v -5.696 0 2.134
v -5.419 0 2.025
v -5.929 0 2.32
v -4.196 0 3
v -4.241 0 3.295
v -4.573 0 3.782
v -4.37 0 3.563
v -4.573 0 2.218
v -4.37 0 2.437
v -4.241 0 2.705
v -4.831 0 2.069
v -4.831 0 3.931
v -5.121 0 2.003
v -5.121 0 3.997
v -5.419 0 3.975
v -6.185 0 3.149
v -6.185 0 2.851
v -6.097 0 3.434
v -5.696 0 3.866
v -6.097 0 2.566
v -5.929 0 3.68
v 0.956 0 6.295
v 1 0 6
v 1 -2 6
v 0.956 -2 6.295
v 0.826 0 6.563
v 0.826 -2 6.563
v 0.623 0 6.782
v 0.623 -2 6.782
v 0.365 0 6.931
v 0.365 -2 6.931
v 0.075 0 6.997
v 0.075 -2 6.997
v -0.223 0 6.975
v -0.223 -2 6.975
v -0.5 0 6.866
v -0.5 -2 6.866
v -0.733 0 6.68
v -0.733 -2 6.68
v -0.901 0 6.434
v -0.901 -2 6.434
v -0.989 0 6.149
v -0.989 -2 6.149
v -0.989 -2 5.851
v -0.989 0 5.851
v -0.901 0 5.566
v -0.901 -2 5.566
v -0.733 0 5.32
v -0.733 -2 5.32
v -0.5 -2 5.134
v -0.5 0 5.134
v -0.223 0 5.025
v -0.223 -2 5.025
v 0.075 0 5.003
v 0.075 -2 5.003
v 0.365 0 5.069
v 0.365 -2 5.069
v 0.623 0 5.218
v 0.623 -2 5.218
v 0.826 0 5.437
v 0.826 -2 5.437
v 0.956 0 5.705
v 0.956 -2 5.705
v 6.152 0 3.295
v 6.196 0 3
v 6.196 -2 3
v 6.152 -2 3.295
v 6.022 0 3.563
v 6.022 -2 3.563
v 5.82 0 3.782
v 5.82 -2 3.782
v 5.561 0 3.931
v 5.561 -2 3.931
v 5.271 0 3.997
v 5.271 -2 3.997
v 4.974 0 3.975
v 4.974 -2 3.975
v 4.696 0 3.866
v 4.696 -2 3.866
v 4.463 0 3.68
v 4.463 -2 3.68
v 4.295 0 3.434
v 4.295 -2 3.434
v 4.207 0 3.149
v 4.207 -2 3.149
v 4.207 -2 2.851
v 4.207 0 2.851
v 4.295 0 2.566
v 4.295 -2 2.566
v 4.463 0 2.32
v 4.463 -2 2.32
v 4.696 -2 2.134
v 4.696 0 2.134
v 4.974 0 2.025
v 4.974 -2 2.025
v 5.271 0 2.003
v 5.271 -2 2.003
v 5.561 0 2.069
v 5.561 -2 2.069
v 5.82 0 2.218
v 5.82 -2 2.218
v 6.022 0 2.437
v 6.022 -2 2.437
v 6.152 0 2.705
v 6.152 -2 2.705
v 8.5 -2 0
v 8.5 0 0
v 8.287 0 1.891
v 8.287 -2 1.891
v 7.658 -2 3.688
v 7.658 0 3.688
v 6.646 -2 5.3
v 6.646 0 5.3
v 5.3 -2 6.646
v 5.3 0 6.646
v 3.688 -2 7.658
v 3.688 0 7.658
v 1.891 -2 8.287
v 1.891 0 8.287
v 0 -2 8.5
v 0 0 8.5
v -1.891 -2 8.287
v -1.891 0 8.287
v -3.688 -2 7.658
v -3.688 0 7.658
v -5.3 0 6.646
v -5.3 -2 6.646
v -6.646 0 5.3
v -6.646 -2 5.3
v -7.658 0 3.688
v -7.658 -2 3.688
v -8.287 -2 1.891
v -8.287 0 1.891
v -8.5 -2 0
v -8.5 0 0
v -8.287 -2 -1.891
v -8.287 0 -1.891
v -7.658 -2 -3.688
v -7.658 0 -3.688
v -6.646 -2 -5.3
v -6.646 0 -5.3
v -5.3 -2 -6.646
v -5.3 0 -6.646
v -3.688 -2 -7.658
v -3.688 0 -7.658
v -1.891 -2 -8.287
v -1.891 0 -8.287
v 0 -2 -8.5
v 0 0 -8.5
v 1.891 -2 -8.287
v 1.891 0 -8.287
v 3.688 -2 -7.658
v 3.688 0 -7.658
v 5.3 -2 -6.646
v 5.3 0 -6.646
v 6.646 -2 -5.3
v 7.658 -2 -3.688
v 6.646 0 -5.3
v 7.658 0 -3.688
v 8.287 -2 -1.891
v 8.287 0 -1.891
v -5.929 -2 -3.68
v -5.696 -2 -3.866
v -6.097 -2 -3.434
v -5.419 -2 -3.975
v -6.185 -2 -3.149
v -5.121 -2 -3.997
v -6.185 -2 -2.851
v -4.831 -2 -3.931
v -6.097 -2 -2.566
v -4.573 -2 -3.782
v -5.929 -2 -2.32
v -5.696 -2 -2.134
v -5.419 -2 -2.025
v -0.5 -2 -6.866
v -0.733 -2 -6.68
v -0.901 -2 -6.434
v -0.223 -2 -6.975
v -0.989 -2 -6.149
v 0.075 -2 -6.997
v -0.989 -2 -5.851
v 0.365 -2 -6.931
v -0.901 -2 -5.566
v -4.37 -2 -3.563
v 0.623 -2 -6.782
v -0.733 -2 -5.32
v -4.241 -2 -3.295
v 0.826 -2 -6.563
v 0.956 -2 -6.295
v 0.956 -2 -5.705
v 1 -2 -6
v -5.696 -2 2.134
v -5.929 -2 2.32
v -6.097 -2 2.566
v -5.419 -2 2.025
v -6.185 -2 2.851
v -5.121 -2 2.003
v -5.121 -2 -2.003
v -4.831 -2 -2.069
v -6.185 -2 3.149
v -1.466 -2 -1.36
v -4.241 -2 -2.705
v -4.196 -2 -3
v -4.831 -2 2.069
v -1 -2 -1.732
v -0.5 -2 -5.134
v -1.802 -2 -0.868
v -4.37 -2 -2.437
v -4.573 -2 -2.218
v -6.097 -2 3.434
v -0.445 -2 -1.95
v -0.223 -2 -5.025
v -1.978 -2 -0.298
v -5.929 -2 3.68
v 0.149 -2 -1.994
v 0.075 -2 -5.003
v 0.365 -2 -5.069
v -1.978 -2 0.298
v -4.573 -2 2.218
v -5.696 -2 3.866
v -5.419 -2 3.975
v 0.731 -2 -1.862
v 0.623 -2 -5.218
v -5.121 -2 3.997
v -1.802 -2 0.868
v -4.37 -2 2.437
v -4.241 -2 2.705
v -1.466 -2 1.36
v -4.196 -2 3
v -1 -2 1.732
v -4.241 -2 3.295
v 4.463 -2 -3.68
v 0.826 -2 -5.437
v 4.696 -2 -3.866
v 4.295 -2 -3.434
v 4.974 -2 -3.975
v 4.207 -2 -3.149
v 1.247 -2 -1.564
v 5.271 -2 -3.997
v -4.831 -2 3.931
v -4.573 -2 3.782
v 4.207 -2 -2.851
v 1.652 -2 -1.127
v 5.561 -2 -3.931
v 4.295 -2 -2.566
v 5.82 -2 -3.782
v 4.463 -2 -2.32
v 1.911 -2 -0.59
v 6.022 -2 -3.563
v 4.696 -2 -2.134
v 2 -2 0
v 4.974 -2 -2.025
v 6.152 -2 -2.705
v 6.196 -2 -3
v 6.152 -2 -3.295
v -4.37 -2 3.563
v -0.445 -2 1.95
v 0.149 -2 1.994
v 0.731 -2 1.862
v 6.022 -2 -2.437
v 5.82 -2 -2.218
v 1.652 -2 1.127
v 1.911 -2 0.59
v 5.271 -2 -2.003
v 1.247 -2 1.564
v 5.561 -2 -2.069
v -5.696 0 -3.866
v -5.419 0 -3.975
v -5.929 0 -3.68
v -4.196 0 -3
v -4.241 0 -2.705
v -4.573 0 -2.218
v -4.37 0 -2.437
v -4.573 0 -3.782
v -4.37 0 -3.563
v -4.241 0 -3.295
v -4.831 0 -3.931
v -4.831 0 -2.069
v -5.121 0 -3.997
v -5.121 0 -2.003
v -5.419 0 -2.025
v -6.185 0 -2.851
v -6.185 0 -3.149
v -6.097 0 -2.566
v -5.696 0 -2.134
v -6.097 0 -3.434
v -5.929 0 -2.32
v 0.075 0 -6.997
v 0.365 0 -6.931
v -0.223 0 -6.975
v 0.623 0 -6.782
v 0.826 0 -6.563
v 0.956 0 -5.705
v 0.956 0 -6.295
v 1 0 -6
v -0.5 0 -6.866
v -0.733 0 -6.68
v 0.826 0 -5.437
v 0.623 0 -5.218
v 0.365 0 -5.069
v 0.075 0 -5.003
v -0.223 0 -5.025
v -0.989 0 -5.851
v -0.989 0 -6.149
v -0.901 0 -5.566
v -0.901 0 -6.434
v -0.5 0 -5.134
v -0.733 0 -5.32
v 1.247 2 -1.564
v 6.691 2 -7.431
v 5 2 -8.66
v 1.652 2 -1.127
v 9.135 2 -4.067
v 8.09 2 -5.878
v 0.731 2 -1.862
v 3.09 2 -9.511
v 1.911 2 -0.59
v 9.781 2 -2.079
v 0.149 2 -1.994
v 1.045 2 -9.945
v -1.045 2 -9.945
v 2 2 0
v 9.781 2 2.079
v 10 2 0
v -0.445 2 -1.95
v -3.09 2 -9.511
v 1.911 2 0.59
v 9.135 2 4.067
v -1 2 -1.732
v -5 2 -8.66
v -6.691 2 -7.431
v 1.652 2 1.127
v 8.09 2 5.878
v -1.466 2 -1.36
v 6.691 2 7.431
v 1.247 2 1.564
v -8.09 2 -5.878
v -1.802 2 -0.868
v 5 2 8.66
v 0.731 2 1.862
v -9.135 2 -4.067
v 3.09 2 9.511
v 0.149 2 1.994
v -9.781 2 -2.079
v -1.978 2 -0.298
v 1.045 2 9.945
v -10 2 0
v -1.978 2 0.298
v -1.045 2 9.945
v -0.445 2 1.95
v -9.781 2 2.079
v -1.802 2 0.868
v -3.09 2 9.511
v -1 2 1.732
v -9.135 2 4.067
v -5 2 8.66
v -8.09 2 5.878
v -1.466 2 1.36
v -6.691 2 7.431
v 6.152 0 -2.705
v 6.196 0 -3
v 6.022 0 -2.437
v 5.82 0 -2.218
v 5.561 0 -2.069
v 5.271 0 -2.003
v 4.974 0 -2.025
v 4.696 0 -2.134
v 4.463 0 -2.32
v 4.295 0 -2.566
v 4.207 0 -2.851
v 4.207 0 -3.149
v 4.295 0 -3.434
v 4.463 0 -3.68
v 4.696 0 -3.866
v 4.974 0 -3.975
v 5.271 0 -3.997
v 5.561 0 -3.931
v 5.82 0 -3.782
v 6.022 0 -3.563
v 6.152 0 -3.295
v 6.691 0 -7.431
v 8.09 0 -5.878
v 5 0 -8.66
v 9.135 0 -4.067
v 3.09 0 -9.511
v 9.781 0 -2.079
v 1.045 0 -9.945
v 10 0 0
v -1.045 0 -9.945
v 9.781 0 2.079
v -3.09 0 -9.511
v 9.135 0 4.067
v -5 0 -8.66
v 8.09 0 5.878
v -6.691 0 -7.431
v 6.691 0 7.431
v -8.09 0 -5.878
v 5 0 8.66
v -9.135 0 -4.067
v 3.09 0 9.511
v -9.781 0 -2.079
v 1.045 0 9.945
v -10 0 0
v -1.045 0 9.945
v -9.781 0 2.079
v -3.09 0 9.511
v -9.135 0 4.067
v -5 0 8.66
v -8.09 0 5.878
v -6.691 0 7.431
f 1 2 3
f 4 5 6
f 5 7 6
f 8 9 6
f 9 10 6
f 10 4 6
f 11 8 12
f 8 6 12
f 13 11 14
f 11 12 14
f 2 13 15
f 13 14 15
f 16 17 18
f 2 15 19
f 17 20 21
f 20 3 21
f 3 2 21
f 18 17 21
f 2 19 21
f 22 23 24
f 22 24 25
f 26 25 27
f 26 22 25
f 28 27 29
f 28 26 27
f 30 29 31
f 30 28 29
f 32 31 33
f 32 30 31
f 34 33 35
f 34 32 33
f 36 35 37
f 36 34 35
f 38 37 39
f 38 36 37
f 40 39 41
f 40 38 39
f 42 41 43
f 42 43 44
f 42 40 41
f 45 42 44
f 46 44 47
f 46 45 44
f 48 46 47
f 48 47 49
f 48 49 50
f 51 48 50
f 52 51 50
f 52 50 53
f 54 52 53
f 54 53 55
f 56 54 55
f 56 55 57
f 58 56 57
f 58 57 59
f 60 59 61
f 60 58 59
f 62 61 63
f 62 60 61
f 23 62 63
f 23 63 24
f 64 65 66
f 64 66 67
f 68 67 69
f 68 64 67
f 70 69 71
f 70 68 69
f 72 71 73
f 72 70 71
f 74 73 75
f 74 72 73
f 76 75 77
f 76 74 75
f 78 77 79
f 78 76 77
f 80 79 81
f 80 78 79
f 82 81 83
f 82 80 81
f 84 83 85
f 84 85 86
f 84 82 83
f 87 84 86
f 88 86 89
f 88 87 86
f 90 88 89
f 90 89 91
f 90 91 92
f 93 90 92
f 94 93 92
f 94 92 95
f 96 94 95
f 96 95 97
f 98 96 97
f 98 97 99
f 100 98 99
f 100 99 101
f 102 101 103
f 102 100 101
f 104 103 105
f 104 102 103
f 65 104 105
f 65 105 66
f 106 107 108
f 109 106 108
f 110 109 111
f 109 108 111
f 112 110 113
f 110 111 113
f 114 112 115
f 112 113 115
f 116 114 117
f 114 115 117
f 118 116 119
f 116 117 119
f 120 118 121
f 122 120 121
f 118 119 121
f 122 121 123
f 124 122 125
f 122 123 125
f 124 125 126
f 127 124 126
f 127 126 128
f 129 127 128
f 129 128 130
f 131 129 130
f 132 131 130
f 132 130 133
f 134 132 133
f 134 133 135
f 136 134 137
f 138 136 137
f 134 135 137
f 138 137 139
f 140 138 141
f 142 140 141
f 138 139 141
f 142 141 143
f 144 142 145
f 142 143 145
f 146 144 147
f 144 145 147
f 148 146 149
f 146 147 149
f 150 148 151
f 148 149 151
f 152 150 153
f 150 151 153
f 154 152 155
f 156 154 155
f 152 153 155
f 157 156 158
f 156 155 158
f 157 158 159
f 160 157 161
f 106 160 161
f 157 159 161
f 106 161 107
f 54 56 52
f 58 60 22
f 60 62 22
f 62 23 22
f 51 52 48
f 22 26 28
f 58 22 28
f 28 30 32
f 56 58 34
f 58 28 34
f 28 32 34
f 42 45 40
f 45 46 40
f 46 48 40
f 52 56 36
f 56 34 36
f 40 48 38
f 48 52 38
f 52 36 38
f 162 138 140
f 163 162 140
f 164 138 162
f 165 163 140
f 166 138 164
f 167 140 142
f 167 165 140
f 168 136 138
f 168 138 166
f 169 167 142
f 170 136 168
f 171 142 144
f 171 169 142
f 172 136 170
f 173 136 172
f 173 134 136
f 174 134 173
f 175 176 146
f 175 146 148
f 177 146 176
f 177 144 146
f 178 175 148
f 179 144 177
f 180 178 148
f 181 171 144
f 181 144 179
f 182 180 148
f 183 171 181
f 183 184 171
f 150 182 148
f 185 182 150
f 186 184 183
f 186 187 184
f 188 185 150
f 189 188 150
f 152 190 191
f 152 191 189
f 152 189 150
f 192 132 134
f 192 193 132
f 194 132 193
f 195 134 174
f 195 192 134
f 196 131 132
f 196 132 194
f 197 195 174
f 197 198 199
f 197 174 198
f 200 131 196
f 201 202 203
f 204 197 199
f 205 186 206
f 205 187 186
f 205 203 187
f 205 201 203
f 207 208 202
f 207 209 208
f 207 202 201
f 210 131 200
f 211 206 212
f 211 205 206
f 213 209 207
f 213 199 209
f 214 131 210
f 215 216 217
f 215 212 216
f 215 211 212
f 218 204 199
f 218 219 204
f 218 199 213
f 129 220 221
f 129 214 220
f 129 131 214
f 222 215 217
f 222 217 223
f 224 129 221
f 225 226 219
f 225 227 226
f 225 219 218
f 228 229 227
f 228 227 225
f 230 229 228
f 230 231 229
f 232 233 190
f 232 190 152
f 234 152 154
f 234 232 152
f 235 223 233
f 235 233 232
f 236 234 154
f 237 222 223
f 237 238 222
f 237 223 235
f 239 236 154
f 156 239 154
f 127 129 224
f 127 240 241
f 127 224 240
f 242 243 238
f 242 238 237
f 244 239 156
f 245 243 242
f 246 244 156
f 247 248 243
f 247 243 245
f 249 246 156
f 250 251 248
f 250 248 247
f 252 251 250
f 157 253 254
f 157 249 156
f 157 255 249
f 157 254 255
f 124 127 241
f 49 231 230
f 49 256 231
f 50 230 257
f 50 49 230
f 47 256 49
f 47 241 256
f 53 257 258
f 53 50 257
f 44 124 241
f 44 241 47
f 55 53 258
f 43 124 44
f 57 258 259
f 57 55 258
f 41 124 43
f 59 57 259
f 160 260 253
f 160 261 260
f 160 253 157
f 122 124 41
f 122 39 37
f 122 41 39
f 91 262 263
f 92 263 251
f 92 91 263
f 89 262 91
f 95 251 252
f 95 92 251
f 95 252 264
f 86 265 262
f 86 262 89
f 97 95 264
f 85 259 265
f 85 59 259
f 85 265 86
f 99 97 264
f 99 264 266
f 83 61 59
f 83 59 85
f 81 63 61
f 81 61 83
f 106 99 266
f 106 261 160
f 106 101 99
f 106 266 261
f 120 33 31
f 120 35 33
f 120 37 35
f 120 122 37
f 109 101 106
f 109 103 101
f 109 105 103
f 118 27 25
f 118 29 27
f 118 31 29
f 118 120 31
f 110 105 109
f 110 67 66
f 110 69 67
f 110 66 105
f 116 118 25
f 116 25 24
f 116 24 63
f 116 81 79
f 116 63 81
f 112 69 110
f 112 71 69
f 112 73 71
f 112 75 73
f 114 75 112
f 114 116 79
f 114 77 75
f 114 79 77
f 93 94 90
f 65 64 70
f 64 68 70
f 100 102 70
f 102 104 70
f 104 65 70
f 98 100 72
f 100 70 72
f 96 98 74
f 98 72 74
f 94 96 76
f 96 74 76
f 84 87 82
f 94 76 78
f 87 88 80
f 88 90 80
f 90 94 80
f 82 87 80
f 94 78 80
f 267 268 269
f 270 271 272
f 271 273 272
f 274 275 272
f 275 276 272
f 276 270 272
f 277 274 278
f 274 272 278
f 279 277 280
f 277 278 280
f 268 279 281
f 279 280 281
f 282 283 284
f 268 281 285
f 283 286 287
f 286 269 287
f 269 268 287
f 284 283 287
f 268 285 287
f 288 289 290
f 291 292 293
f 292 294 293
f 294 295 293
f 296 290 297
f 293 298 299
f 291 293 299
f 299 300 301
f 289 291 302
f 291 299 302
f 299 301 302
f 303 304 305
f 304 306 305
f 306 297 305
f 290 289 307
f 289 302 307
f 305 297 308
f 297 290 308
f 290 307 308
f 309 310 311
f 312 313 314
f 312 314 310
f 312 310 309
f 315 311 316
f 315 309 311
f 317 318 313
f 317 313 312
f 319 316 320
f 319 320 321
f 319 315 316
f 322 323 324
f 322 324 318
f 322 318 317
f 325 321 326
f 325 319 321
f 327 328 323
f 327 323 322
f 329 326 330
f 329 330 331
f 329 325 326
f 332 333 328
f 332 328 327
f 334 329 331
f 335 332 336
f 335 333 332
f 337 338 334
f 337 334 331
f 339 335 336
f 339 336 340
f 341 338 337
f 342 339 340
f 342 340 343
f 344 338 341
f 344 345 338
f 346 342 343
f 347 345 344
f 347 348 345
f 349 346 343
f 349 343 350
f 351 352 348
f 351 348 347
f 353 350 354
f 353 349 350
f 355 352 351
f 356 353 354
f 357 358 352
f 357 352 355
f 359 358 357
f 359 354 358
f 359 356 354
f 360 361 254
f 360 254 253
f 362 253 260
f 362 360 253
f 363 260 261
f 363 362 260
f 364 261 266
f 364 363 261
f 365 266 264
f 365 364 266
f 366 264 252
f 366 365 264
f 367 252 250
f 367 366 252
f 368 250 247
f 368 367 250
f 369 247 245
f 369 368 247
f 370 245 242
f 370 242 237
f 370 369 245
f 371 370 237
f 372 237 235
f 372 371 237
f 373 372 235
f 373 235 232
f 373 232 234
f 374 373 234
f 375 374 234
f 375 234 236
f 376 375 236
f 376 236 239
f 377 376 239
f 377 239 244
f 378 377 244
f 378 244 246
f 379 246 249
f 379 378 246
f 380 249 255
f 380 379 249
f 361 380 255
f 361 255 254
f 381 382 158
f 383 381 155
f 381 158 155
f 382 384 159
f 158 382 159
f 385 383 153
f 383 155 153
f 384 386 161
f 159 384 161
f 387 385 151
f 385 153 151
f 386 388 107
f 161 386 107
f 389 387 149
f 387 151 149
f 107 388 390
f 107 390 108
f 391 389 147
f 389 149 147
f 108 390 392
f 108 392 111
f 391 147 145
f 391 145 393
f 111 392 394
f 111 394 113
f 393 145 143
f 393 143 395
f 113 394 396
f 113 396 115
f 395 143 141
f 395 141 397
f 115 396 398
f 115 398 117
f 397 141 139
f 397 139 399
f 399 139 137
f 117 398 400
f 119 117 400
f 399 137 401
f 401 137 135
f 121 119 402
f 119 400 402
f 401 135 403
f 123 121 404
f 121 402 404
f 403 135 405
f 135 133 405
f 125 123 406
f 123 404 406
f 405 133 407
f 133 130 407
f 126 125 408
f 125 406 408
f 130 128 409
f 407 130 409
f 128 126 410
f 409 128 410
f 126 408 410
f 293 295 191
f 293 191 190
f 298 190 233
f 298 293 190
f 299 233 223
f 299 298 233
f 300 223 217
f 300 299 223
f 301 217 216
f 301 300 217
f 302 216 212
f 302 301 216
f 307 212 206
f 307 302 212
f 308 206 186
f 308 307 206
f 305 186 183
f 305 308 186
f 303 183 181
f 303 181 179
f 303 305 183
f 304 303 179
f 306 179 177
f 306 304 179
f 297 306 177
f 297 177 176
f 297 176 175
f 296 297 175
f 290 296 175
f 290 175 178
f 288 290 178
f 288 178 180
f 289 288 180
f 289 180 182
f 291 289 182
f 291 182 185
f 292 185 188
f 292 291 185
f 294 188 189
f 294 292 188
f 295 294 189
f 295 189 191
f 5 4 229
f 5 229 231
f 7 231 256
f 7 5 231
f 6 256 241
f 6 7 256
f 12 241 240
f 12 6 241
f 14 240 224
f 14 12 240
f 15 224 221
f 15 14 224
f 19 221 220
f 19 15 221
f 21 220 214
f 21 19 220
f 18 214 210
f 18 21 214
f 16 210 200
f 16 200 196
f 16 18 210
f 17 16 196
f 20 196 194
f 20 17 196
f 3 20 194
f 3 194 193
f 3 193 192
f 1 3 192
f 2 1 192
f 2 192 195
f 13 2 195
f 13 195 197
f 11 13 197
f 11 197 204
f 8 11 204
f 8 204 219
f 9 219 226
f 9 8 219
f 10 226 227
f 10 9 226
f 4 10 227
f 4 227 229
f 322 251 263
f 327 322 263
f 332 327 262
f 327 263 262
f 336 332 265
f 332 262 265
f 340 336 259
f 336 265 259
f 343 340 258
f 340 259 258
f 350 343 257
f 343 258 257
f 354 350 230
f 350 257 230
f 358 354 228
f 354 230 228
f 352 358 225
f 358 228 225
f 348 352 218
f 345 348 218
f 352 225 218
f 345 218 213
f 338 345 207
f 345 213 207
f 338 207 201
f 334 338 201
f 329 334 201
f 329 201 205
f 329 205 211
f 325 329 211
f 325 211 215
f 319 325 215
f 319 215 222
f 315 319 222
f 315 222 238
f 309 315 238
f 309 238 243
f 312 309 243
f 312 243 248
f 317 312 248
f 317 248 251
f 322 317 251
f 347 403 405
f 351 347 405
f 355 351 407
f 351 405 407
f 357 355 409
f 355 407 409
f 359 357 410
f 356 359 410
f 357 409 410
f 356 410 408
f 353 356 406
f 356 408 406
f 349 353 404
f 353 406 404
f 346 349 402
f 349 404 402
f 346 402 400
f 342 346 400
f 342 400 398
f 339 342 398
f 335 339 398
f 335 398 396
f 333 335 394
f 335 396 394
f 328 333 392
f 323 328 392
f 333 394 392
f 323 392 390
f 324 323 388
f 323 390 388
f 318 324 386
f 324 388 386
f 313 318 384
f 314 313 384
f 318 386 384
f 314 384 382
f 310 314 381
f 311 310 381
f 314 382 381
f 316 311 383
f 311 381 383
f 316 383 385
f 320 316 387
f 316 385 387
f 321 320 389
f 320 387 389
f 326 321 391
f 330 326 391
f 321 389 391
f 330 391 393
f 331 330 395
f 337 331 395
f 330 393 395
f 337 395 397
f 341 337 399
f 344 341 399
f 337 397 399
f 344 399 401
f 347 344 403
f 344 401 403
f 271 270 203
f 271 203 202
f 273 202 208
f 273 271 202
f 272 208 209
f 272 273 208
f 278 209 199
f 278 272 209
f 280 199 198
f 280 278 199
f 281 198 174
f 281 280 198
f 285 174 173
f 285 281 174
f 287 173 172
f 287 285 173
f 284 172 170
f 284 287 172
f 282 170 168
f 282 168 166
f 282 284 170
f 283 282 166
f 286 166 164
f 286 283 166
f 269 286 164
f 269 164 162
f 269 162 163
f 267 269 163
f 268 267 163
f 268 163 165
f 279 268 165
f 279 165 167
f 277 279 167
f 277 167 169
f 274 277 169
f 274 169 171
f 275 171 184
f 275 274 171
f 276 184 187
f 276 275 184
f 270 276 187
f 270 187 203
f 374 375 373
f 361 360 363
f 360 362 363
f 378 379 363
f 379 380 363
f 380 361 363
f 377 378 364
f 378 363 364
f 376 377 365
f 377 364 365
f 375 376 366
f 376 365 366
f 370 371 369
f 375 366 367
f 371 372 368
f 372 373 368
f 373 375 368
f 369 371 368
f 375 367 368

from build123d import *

# Parameters (mm, degrees)
F0_R     = 8.5
F0_R_2   = 1
F1_DEPTH = 2
F2_R     = 10
F3_DEPTH = 2
F4_R     = 2
F5_DEPTH = 4.001


with BuildPart() as f1:
    # F0 (on Front) → F1 (new body)
    with BuildSketch(Plane.XZ):
        Circle(F0_R)
        with Locations((-5.196152, -3)):
            Circle(F0_R_2, mode=Mode.SUBTRACT)
        with Locations((0, -6)):
            Circle(F0_R_2, mode=Mode.SUBTRACT)
        with Locations((5.196152, -3)):
            Circle(F0_R_2, mode=Mode.SUBTRACT)
        with Locations((-5.196152, 3)):
            Circle(F0_R_2, mode=Mode.SUBTRACT)
        with Locations((5.196152, 3)):
            Circle(F0_R_2, mode=Mode.SUBTRACT)
        with Locations((0, 6)):
            Circle(F0_R_2, mode=Mode.SUBTRACT)
    extrude(amount=F1_DEPTH)

    # F2 (on face) → F3 (join)
    with BuildSketch(Plane(origin=(0, 0, 0), x_dir=(-1, 0, 0), z_dir=(0, 1, 0))):
        Circle(F2_R)
    extrude(amount=F3_DEPTH)

    # F4 (on face) → F5 (cut, through all)
    with BuildSketch(Plane.XZ.offset(2)):
        Circle(F4_R)
    extrude(amount=-F5_DEPTH, mode=Mode.SUBTRACT)


solid = f1.part
